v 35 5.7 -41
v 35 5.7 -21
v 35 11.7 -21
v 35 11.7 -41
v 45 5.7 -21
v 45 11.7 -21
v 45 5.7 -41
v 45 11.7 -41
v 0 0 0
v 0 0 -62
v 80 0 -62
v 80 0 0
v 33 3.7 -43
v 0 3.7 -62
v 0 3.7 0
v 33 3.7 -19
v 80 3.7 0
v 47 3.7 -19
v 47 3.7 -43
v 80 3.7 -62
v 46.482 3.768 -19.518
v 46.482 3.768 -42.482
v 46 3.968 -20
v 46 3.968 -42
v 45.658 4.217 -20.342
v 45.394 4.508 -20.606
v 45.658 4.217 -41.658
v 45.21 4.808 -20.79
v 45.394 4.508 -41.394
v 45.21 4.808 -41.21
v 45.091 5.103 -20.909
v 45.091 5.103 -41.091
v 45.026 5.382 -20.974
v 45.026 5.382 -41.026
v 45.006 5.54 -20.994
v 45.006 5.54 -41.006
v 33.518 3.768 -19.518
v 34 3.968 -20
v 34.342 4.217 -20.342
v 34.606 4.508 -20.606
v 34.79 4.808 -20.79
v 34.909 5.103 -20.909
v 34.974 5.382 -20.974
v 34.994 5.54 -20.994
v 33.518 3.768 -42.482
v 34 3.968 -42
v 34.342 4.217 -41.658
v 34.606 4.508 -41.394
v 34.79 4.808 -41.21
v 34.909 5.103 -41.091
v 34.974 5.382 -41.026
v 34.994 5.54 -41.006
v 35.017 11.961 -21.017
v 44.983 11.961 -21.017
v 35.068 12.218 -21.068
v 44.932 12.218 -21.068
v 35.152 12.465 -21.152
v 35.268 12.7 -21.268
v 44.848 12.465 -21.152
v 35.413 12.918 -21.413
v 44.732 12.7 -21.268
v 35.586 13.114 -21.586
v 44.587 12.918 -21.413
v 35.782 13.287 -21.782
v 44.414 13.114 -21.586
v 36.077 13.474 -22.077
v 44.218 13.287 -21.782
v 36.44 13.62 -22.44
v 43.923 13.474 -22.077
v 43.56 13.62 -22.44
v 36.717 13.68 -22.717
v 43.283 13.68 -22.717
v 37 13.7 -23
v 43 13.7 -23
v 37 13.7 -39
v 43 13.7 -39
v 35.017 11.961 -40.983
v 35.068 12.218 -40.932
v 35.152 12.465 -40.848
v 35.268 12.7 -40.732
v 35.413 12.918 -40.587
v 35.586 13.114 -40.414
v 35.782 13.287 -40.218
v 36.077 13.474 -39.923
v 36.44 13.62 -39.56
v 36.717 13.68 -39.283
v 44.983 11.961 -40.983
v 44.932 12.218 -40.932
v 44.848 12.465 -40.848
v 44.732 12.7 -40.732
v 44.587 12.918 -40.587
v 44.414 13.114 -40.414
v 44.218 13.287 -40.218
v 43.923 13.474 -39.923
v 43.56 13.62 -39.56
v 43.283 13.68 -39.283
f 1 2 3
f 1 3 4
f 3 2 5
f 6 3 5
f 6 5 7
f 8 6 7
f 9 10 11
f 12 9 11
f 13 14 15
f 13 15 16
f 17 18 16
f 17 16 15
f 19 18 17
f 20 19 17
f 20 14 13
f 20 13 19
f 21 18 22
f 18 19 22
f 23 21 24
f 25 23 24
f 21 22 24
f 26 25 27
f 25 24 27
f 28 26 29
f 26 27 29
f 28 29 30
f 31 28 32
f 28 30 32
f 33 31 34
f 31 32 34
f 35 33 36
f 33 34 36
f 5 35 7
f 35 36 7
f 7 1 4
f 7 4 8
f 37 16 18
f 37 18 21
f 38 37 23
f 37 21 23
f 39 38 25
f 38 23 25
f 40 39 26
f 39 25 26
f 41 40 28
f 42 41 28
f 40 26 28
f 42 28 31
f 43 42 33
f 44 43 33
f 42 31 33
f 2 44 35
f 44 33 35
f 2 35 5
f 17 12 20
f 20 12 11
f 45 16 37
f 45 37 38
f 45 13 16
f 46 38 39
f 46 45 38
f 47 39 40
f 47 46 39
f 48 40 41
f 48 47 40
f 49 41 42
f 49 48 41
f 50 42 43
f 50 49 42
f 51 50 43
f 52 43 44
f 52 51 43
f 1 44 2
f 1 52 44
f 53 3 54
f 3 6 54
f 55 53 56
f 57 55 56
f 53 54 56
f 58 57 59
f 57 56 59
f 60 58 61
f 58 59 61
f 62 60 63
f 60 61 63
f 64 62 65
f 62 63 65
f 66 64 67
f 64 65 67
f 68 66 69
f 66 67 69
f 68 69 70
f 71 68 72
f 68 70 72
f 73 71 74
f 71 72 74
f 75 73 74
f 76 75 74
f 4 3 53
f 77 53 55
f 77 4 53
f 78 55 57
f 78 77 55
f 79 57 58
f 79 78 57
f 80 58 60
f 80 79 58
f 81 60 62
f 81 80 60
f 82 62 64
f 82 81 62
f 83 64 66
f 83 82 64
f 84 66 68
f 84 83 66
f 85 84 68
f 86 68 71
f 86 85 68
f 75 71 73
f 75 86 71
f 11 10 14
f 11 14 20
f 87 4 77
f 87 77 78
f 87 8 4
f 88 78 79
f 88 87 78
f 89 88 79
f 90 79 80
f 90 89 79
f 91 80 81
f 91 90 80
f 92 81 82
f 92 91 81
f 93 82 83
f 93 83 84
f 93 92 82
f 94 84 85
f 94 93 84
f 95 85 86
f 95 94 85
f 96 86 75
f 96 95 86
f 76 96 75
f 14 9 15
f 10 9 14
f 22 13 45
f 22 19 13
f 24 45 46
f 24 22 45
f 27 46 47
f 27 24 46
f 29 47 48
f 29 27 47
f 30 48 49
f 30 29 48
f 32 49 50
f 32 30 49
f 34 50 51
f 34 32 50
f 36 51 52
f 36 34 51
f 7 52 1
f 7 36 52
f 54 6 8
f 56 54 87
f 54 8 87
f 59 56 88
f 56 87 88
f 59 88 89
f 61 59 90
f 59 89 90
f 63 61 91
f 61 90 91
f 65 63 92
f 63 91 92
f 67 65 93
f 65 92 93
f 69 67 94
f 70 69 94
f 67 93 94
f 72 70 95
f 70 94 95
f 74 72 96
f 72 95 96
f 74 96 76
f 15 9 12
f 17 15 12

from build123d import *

# Parameters (mm, degrees)
SKETCH1_W           = 80
SKETCH1_H           = 62
BOSS_EXTRUDE1_DEPTH = 3.7
SKETCH2_W           = 10
SKETCH2_H           = 20
BOSS_EXTRUDE2_DEPTH = 10
FILLET1_R           = 2
FILLET2_R           = 2


with BuildPart() as part:
    # Sketch1 → Boss-Extrude1 (new body)
    with BuildSketch(Plane(origin=(0, 0, 0), x_dir=(1, 0, 0), z_dir=(0, 1, 0))):
        with Locations((40, 31)):
            Rectangle(SKETCH1_W, SKETCH1_H)
    extrude(amount=BOSS_EXTRUDE1_DEPTH)

    # Sketch2 → Boss-Extrude2 (add)
    with BuildSketch(Plane(origin=(0, 3.7, 0), x_dir=(1, 0, 0), z_dir=(0, 1, 0))):
        with Locations((40, 31)):
            Rectangle(SKETCH2_W, SKETCH2_H)
    extrude(amount=BOSS_EXTRUDE2_DEPTH)

    # Fillet1
    fillet1_edges = [part.edges().sort_by_distance(p)[0] for p in [
        (35, 3.7, -31),
        (40, 3.7, -21),
        (45, 3.7, -31),
        (40, 3.7, -41),
    ]]
    fillet(fillet1_edges, radius=FILLET1_R)

    # Fillet2
    fillet2_edges = [part.edges().sort_by_distance(p)[0] for p in [
        (35, 13.7, -31),
        (40, 13.7, -21),
        (45, 13.7, -31),
        (40, 13.7, -41),
    ]]
    fillet(fillet2_edges, radius=FILLET2_R)


solid = part.part
